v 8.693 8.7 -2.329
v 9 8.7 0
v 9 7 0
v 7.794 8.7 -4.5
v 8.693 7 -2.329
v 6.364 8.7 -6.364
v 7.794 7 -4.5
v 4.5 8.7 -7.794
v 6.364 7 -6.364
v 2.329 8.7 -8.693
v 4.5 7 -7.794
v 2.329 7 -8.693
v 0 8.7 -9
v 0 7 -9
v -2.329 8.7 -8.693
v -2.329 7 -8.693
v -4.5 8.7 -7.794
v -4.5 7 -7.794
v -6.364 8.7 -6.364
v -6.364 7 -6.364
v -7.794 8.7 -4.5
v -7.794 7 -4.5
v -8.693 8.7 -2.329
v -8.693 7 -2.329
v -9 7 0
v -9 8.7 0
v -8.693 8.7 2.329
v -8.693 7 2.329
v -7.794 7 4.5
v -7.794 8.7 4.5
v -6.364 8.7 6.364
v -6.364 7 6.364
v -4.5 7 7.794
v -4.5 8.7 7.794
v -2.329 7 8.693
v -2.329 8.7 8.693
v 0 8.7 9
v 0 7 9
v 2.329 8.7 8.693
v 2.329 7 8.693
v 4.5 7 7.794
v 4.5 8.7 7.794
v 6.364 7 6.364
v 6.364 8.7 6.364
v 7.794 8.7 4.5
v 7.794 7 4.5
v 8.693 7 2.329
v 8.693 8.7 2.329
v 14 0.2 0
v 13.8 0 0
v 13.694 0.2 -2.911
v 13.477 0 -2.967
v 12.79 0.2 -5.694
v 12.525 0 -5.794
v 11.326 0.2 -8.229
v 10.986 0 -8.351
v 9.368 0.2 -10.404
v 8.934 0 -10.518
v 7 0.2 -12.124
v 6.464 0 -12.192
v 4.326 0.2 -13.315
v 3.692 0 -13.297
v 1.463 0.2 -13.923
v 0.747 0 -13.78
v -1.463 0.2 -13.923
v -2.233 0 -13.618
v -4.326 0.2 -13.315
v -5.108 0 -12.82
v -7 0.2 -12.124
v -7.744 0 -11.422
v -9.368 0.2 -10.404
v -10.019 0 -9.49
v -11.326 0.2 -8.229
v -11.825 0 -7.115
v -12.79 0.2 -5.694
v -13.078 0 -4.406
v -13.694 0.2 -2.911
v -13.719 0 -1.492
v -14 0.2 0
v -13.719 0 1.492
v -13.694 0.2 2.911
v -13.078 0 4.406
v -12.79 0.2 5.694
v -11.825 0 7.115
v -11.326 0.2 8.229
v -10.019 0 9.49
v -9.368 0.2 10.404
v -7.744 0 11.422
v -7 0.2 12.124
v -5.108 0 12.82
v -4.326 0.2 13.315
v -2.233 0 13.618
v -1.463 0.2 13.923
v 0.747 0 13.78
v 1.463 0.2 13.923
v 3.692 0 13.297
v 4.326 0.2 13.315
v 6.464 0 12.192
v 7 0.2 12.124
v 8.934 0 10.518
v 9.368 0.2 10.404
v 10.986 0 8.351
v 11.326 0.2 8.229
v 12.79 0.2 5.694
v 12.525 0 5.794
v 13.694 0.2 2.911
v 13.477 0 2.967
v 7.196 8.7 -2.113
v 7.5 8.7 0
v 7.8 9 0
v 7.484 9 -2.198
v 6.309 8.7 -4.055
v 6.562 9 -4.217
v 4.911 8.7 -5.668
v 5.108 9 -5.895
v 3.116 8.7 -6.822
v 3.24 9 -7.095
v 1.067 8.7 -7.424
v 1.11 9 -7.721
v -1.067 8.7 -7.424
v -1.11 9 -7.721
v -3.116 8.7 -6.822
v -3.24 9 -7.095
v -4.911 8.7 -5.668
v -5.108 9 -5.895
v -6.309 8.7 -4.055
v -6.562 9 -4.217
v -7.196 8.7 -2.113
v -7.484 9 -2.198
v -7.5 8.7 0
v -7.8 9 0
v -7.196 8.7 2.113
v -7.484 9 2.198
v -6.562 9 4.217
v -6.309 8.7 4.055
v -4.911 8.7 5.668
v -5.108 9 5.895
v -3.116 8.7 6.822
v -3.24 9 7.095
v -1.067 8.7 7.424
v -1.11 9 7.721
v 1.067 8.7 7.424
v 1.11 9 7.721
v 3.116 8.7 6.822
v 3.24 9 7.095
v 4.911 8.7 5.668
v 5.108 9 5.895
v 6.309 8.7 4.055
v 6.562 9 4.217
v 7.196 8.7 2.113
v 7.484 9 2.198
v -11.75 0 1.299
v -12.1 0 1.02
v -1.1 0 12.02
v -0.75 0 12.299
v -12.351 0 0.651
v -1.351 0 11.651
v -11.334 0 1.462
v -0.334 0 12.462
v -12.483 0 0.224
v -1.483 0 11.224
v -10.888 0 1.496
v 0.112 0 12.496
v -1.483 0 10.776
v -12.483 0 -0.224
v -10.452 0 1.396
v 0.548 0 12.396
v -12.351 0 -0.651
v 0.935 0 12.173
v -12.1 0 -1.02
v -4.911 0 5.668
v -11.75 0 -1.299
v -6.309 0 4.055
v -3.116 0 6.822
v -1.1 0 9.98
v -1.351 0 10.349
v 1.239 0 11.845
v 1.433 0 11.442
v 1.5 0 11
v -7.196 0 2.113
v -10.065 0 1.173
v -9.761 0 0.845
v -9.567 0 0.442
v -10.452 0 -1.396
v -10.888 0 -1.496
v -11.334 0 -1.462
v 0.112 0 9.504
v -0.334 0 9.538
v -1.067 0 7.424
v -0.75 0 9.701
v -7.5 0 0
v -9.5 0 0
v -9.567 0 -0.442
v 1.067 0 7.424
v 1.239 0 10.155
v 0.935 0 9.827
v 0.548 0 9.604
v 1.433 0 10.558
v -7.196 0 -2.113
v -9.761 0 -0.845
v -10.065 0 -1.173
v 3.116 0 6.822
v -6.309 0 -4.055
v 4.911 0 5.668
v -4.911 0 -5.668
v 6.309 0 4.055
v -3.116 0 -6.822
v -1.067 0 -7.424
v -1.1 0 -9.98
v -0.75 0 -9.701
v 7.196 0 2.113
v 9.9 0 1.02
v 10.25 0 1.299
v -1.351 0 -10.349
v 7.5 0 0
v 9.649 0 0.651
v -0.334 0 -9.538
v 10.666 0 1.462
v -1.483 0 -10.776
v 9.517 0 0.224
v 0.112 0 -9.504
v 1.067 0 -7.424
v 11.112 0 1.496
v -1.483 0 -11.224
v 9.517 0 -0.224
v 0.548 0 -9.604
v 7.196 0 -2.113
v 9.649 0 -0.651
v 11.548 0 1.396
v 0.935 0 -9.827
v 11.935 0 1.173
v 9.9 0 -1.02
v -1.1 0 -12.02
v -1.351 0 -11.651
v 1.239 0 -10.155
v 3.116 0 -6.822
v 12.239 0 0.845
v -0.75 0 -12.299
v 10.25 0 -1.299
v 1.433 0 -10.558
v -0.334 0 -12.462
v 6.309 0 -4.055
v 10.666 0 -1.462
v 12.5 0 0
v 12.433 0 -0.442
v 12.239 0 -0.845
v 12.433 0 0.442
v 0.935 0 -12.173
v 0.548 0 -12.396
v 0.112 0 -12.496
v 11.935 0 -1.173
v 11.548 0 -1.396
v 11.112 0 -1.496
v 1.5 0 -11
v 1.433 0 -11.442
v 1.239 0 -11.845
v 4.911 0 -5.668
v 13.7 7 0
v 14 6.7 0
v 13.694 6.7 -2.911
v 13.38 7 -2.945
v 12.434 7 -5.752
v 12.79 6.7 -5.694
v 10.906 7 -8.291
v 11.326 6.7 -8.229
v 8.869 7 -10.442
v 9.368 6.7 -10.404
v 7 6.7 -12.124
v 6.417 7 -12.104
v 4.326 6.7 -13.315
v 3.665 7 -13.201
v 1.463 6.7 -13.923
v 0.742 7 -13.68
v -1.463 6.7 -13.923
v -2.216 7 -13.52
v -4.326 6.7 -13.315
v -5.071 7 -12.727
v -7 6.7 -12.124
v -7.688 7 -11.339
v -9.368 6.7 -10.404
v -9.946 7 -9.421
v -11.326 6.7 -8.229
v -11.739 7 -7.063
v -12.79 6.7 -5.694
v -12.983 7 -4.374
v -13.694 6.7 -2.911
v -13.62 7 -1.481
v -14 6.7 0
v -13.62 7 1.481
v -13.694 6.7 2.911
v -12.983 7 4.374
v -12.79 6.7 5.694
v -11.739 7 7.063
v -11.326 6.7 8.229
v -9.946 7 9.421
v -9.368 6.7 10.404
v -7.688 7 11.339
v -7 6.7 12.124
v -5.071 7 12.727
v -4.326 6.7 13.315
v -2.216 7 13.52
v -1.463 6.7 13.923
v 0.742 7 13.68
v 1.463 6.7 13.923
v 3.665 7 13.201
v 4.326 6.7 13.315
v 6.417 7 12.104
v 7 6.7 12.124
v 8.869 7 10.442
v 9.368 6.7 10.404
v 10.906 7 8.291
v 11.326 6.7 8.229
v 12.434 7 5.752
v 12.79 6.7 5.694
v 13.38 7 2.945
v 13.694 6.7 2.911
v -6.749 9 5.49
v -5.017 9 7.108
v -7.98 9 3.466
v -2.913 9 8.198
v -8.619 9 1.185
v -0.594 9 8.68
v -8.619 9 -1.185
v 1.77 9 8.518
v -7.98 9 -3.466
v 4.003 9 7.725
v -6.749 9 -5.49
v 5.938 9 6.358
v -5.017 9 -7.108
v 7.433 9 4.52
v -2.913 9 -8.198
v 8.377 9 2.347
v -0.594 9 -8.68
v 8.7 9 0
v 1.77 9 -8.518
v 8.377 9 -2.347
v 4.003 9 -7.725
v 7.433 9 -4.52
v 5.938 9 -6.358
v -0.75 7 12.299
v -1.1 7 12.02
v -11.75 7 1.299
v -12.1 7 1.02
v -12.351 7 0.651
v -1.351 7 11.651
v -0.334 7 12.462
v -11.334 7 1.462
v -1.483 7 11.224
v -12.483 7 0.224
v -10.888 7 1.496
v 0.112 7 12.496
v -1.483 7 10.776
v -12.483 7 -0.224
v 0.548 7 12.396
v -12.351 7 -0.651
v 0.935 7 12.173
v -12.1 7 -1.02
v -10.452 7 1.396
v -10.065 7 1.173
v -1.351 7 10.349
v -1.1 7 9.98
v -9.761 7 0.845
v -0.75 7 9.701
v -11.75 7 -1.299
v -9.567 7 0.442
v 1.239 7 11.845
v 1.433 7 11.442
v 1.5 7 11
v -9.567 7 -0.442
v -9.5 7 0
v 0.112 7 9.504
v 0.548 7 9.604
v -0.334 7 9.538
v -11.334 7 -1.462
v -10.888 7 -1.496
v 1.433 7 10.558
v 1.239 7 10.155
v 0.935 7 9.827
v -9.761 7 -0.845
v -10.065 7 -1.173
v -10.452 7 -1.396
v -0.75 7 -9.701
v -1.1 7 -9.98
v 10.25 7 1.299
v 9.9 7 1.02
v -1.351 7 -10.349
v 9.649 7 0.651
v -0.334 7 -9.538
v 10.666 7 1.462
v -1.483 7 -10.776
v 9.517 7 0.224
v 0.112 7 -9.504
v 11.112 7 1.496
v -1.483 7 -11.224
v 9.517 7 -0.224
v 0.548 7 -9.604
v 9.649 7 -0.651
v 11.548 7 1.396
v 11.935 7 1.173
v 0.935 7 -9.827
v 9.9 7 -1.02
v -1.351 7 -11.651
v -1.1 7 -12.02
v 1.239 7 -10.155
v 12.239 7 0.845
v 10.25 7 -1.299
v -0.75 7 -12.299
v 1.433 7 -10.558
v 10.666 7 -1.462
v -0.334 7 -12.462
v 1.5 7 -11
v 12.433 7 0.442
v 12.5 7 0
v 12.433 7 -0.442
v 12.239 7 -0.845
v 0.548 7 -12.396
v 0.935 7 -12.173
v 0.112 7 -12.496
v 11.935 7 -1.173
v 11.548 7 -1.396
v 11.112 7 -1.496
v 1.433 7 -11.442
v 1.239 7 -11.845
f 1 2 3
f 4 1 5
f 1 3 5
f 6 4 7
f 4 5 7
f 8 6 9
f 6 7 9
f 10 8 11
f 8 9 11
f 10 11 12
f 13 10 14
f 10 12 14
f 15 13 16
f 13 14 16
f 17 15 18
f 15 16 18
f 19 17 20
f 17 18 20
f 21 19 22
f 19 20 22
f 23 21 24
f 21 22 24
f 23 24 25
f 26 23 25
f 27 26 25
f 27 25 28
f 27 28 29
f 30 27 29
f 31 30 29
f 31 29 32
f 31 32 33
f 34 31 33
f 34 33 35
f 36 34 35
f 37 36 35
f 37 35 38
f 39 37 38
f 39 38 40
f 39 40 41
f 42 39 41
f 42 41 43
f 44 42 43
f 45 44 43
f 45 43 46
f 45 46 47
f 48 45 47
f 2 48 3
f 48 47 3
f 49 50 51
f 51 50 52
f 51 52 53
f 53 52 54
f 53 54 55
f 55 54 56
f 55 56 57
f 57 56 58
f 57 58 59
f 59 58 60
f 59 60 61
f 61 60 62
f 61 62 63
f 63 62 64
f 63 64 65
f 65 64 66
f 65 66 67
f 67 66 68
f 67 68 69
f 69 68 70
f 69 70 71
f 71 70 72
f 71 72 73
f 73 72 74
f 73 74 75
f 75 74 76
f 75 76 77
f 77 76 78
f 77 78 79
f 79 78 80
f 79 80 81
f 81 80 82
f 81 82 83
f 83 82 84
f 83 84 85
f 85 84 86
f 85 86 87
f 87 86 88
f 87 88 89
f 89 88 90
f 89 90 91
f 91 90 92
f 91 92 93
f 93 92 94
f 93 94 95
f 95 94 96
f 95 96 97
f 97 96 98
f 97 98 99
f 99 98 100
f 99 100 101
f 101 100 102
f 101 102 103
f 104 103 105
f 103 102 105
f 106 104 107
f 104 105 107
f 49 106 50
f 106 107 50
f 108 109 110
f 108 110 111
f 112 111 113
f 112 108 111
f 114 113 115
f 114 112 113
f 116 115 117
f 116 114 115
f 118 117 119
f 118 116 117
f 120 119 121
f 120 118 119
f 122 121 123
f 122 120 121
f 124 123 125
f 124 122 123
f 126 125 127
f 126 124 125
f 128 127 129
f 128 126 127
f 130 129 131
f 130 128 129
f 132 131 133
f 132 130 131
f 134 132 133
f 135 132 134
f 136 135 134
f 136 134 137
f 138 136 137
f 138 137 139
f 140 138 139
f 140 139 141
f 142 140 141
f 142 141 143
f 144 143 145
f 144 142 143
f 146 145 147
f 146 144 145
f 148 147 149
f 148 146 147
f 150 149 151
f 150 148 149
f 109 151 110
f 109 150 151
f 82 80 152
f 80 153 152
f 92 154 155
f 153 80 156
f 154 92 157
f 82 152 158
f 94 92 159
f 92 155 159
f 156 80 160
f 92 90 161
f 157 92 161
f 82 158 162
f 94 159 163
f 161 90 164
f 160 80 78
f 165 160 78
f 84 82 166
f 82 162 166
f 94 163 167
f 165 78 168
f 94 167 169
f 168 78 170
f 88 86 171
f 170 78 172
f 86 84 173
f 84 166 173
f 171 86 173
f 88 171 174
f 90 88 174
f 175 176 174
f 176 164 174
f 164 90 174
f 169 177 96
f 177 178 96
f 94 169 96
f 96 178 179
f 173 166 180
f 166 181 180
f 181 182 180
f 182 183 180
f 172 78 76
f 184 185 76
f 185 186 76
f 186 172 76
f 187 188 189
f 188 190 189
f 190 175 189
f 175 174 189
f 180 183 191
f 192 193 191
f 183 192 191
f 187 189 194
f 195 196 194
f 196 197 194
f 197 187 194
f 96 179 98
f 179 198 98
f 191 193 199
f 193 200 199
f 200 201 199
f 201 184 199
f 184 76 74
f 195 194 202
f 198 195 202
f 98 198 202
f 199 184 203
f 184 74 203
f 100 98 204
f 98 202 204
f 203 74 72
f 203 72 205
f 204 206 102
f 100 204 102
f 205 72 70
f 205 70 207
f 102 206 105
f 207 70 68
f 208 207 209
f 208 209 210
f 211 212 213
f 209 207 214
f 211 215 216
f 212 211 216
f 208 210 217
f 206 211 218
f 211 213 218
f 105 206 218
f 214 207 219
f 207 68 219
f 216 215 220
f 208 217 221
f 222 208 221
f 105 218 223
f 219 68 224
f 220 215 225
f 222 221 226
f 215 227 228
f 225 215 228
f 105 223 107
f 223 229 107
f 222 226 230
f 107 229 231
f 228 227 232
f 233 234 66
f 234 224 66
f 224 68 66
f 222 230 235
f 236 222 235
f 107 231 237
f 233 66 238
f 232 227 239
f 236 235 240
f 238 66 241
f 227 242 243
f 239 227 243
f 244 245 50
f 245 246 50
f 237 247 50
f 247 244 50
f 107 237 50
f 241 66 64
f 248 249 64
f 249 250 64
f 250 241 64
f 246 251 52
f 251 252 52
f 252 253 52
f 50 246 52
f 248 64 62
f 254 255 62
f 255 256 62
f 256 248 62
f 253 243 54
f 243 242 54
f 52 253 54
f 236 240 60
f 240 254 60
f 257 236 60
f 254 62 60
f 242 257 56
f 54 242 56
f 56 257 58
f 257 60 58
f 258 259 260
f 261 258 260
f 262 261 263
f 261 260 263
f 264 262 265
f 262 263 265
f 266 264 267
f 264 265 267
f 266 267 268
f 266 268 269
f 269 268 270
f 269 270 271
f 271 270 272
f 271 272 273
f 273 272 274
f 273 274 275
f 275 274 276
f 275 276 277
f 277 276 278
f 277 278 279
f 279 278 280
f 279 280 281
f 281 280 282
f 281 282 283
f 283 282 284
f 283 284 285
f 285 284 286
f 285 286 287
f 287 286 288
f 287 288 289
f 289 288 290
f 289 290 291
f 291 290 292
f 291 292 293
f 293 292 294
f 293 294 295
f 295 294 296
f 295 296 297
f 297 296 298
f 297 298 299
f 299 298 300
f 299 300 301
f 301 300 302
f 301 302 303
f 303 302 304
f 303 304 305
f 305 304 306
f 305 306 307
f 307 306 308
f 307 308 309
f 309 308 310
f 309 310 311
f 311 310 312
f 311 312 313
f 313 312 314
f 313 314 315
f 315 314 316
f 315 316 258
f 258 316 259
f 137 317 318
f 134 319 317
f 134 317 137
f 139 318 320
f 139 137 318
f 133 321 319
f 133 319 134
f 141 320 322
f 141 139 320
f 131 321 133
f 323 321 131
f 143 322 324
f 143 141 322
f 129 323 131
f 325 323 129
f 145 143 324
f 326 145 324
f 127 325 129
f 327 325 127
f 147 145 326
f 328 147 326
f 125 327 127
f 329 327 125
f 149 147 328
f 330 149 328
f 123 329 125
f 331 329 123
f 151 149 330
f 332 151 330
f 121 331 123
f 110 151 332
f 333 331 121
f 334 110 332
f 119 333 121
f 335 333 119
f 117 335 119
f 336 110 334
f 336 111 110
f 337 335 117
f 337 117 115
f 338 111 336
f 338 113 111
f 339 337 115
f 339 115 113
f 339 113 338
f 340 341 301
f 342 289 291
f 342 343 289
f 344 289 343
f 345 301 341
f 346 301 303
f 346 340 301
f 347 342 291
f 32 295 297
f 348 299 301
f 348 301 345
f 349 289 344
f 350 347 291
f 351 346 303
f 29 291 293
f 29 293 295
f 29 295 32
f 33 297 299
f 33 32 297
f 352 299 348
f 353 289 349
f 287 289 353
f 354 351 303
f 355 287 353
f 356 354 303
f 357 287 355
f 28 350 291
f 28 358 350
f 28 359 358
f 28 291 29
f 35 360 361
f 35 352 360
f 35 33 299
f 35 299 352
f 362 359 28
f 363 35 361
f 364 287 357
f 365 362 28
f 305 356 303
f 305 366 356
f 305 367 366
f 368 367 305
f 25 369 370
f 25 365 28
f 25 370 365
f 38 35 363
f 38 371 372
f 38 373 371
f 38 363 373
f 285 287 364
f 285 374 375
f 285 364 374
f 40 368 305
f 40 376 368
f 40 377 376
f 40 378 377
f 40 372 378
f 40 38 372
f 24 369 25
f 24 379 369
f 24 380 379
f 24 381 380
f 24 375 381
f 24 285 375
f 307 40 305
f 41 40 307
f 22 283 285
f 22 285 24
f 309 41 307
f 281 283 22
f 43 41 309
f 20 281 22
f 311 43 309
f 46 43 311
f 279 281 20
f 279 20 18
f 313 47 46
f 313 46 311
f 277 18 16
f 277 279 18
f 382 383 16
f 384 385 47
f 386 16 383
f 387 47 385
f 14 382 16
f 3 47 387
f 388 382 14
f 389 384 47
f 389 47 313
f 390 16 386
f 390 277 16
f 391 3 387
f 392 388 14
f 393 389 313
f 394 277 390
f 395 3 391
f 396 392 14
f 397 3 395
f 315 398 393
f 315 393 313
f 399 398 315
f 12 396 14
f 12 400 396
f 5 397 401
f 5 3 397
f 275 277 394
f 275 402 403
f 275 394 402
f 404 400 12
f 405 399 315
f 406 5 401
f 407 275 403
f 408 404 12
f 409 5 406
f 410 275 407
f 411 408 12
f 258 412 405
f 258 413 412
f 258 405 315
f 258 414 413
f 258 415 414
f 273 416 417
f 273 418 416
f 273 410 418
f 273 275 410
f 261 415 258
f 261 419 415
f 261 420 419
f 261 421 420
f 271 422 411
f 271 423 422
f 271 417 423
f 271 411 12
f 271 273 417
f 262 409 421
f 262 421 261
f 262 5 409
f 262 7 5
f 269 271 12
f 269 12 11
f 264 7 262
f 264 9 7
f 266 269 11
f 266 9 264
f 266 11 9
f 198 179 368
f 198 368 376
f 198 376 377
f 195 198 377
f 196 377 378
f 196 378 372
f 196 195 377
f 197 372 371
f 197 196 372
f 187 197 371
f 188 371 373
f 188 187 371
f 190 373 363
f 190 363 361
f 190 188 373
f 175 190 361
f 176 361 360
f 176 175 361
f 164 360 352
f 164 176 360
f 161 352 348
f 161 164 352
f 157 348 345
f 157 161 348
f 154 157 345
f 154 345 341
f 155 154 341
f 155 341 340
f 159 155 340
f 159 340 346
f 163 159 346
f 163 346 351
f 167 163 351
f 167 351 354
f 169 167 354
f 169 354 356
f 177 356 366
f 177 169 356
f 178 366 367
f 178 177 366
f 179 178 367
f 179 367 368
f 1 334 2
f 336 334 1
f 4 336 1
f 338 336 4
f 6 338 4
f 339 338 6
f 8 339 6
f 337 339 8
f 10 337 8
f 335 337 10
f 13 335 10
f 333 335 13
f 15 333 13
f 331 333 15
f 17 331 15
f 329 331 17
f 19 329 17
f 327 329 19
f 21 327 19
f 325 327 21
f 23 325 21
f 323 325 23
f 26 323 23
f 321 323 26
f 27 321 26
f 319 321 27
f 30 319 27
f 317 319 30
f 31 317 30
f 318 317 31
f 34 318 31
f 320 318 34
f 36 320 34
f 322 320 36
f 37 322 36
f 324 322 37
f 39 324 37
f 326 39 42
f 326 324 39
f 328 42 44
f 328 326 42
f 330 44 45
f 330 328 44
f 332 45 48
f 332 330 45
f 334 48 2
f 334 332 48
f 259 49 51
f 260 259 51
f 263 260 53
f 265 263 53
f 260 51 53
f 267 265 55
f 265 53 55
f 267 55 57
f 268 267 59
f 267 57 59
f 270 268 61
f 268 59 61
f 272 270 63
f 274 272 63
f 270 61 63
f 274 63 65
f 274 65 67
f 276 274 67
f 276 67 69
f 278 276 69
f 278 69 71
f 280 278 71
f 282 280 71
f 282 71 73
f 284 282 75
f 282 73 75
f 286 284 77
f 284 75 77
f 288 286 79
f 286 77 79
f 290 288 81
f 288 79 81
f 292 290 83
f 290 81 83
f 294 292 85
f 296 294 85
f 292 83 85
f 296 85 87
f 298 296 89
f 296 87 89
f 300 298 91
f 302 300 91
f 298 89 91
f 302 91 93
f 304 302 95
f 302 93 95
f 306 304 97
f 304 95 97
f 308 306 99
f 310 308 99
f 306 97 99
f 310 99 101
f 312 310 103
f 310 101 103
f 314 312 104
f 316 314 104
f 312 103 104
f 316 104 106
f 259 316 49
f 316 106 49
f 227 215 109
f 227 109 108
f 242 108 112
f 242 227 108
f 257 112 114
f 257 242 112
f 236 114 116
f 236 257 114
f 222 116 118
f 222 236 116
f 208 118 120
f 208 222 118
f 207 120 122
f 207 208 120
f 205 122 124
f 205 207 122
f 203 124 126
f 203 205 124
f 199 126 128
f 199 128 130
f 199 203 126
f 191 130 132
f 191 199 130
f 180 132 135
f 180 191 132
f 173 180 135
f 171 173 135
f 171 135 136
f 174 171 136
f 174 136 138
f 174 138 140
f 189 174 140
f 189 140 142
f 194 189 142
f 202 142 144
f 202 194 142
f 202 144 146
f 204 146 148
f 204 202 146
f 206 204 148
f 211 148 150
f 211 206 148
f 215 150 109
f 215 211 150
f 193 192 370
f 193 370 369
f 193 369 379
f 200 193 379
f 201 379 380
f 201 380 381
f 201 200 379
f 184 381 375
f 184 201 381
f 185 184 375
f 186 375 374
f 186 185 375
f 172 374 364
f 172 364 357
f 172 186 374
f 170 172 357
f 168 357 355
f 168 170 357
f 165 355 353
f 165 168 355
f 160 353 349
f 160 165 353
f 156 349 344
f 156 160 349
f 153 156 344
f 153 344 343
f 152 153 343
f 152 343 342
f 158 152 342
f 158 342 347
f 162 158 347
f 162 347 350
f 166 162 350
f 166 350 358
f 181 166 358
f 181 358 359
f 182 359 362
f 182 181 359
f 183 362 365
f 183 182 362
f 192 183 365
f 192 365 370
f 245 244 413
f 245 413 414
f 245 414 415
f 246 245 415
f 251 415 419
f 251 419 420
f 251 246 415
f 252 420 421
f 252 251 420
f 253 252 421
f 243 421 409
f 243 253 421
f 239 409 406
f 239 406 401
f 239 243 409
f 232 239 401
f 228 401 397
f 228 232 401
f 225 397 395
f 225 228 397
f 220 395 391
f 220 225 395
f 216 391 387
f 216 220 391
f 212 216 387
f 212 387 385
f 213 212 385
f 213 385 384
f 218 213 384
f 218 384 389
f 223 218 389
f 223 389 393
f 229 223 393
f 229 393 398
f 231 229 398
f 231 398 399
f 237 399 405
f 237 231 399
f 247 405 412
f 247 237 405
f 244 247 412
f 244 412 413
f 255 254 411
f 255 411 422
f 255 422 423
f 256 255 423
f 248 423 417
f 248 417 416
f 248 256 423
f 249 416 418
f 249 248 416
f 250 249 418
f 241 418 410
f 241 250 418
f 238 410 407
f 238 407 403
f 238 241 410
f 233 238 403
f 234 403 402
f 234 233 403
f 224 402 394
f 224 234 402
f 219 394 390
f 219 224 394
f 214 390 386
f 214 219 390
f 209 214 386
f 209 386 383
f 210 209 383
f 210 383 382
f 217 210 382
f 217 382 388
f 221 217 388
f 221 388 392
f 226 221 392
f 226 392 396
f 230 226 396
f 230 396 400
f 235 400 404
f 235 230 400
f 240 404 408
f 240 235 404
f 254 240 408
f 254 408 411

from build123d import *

# Parameters (mm, degrees)
SKETCH_1_R      = 14
SKETCH_1_R_2    = 1.5
SKETCH_1_R_3    = 7.5
EXTRUDE_1_DEPTH = 7
SKETCH_1_3_R    = 9
SKETCH_1_3_R_2  = 7.5
EXTRUDE_2_DEPTH = 9
CHAMFER_1_SIZE  = 0.3
CHAMFER_4_SIZE  = 0.2


with BuildPart() as part:
    # Эскиз1 → Бобышка-Вытянуть1 (new body)
    with BuildSketch(Plane(origin=(0, 0, 0), x_dir=(1, 0, 0), z_dir=(0, 1, 0))):
        Circle(SKETCH_1_R)
        with Locations((-11, 0)):
            Circle(SKETCH_1_R_2, mode=Mode.SUBTRACT)
        with Locations((0, -11)):
            Circle(SKETCH_1_R_2, mode=Mode.SUBTRACT)
        with Locations((11, 0)):
            Circle(SKETCH_1_R_2, mode=Mode.SUBTRACT)
        with Locations((0, 11)):
            Circle(SKETCH_1_R_2, mode=Mode.SUBTRACT)
        Circle(SKETCH_1_R_3, mode=Mode.SUBTRACT)
    extrude(amount=EXTRUDE_1_DEPTH)

    # Эскиз1<3> → Бобышка-Вытянуть2 (add)
    with BuildSketch(Plane(origin=(0, 0, 0), x_dir=(1, 0, 0), z_dir=(0, 1, 0))):
        Circle(SKETCH_1_3_R)
        Circle(SKETCH_1_3_R_2, mode=Mode.SUBTRACT)
    extrude(amount=EXTRUDE_2_DEPTH)

    # Фаска1
    chamfer_1_edges = [part.edges().sort_by_distance(p)[0] for p in [
        (-9, 9, 0),
        (-14, 7, 0),
        (-7.5, 9, 0),
    ]]
    chamfer(chamfer_1_edges, length=CHAMFER_1_SIZE)

    # Фаска4
    chamfer_4_edges = [part.edges().sort_by_distance(p)[0] for p in [
        (-14, 0, 0),
    ]]
    chamfer(chamfer_4_edges, length=CHAMFER_4_SIZE)


solid = part.part
